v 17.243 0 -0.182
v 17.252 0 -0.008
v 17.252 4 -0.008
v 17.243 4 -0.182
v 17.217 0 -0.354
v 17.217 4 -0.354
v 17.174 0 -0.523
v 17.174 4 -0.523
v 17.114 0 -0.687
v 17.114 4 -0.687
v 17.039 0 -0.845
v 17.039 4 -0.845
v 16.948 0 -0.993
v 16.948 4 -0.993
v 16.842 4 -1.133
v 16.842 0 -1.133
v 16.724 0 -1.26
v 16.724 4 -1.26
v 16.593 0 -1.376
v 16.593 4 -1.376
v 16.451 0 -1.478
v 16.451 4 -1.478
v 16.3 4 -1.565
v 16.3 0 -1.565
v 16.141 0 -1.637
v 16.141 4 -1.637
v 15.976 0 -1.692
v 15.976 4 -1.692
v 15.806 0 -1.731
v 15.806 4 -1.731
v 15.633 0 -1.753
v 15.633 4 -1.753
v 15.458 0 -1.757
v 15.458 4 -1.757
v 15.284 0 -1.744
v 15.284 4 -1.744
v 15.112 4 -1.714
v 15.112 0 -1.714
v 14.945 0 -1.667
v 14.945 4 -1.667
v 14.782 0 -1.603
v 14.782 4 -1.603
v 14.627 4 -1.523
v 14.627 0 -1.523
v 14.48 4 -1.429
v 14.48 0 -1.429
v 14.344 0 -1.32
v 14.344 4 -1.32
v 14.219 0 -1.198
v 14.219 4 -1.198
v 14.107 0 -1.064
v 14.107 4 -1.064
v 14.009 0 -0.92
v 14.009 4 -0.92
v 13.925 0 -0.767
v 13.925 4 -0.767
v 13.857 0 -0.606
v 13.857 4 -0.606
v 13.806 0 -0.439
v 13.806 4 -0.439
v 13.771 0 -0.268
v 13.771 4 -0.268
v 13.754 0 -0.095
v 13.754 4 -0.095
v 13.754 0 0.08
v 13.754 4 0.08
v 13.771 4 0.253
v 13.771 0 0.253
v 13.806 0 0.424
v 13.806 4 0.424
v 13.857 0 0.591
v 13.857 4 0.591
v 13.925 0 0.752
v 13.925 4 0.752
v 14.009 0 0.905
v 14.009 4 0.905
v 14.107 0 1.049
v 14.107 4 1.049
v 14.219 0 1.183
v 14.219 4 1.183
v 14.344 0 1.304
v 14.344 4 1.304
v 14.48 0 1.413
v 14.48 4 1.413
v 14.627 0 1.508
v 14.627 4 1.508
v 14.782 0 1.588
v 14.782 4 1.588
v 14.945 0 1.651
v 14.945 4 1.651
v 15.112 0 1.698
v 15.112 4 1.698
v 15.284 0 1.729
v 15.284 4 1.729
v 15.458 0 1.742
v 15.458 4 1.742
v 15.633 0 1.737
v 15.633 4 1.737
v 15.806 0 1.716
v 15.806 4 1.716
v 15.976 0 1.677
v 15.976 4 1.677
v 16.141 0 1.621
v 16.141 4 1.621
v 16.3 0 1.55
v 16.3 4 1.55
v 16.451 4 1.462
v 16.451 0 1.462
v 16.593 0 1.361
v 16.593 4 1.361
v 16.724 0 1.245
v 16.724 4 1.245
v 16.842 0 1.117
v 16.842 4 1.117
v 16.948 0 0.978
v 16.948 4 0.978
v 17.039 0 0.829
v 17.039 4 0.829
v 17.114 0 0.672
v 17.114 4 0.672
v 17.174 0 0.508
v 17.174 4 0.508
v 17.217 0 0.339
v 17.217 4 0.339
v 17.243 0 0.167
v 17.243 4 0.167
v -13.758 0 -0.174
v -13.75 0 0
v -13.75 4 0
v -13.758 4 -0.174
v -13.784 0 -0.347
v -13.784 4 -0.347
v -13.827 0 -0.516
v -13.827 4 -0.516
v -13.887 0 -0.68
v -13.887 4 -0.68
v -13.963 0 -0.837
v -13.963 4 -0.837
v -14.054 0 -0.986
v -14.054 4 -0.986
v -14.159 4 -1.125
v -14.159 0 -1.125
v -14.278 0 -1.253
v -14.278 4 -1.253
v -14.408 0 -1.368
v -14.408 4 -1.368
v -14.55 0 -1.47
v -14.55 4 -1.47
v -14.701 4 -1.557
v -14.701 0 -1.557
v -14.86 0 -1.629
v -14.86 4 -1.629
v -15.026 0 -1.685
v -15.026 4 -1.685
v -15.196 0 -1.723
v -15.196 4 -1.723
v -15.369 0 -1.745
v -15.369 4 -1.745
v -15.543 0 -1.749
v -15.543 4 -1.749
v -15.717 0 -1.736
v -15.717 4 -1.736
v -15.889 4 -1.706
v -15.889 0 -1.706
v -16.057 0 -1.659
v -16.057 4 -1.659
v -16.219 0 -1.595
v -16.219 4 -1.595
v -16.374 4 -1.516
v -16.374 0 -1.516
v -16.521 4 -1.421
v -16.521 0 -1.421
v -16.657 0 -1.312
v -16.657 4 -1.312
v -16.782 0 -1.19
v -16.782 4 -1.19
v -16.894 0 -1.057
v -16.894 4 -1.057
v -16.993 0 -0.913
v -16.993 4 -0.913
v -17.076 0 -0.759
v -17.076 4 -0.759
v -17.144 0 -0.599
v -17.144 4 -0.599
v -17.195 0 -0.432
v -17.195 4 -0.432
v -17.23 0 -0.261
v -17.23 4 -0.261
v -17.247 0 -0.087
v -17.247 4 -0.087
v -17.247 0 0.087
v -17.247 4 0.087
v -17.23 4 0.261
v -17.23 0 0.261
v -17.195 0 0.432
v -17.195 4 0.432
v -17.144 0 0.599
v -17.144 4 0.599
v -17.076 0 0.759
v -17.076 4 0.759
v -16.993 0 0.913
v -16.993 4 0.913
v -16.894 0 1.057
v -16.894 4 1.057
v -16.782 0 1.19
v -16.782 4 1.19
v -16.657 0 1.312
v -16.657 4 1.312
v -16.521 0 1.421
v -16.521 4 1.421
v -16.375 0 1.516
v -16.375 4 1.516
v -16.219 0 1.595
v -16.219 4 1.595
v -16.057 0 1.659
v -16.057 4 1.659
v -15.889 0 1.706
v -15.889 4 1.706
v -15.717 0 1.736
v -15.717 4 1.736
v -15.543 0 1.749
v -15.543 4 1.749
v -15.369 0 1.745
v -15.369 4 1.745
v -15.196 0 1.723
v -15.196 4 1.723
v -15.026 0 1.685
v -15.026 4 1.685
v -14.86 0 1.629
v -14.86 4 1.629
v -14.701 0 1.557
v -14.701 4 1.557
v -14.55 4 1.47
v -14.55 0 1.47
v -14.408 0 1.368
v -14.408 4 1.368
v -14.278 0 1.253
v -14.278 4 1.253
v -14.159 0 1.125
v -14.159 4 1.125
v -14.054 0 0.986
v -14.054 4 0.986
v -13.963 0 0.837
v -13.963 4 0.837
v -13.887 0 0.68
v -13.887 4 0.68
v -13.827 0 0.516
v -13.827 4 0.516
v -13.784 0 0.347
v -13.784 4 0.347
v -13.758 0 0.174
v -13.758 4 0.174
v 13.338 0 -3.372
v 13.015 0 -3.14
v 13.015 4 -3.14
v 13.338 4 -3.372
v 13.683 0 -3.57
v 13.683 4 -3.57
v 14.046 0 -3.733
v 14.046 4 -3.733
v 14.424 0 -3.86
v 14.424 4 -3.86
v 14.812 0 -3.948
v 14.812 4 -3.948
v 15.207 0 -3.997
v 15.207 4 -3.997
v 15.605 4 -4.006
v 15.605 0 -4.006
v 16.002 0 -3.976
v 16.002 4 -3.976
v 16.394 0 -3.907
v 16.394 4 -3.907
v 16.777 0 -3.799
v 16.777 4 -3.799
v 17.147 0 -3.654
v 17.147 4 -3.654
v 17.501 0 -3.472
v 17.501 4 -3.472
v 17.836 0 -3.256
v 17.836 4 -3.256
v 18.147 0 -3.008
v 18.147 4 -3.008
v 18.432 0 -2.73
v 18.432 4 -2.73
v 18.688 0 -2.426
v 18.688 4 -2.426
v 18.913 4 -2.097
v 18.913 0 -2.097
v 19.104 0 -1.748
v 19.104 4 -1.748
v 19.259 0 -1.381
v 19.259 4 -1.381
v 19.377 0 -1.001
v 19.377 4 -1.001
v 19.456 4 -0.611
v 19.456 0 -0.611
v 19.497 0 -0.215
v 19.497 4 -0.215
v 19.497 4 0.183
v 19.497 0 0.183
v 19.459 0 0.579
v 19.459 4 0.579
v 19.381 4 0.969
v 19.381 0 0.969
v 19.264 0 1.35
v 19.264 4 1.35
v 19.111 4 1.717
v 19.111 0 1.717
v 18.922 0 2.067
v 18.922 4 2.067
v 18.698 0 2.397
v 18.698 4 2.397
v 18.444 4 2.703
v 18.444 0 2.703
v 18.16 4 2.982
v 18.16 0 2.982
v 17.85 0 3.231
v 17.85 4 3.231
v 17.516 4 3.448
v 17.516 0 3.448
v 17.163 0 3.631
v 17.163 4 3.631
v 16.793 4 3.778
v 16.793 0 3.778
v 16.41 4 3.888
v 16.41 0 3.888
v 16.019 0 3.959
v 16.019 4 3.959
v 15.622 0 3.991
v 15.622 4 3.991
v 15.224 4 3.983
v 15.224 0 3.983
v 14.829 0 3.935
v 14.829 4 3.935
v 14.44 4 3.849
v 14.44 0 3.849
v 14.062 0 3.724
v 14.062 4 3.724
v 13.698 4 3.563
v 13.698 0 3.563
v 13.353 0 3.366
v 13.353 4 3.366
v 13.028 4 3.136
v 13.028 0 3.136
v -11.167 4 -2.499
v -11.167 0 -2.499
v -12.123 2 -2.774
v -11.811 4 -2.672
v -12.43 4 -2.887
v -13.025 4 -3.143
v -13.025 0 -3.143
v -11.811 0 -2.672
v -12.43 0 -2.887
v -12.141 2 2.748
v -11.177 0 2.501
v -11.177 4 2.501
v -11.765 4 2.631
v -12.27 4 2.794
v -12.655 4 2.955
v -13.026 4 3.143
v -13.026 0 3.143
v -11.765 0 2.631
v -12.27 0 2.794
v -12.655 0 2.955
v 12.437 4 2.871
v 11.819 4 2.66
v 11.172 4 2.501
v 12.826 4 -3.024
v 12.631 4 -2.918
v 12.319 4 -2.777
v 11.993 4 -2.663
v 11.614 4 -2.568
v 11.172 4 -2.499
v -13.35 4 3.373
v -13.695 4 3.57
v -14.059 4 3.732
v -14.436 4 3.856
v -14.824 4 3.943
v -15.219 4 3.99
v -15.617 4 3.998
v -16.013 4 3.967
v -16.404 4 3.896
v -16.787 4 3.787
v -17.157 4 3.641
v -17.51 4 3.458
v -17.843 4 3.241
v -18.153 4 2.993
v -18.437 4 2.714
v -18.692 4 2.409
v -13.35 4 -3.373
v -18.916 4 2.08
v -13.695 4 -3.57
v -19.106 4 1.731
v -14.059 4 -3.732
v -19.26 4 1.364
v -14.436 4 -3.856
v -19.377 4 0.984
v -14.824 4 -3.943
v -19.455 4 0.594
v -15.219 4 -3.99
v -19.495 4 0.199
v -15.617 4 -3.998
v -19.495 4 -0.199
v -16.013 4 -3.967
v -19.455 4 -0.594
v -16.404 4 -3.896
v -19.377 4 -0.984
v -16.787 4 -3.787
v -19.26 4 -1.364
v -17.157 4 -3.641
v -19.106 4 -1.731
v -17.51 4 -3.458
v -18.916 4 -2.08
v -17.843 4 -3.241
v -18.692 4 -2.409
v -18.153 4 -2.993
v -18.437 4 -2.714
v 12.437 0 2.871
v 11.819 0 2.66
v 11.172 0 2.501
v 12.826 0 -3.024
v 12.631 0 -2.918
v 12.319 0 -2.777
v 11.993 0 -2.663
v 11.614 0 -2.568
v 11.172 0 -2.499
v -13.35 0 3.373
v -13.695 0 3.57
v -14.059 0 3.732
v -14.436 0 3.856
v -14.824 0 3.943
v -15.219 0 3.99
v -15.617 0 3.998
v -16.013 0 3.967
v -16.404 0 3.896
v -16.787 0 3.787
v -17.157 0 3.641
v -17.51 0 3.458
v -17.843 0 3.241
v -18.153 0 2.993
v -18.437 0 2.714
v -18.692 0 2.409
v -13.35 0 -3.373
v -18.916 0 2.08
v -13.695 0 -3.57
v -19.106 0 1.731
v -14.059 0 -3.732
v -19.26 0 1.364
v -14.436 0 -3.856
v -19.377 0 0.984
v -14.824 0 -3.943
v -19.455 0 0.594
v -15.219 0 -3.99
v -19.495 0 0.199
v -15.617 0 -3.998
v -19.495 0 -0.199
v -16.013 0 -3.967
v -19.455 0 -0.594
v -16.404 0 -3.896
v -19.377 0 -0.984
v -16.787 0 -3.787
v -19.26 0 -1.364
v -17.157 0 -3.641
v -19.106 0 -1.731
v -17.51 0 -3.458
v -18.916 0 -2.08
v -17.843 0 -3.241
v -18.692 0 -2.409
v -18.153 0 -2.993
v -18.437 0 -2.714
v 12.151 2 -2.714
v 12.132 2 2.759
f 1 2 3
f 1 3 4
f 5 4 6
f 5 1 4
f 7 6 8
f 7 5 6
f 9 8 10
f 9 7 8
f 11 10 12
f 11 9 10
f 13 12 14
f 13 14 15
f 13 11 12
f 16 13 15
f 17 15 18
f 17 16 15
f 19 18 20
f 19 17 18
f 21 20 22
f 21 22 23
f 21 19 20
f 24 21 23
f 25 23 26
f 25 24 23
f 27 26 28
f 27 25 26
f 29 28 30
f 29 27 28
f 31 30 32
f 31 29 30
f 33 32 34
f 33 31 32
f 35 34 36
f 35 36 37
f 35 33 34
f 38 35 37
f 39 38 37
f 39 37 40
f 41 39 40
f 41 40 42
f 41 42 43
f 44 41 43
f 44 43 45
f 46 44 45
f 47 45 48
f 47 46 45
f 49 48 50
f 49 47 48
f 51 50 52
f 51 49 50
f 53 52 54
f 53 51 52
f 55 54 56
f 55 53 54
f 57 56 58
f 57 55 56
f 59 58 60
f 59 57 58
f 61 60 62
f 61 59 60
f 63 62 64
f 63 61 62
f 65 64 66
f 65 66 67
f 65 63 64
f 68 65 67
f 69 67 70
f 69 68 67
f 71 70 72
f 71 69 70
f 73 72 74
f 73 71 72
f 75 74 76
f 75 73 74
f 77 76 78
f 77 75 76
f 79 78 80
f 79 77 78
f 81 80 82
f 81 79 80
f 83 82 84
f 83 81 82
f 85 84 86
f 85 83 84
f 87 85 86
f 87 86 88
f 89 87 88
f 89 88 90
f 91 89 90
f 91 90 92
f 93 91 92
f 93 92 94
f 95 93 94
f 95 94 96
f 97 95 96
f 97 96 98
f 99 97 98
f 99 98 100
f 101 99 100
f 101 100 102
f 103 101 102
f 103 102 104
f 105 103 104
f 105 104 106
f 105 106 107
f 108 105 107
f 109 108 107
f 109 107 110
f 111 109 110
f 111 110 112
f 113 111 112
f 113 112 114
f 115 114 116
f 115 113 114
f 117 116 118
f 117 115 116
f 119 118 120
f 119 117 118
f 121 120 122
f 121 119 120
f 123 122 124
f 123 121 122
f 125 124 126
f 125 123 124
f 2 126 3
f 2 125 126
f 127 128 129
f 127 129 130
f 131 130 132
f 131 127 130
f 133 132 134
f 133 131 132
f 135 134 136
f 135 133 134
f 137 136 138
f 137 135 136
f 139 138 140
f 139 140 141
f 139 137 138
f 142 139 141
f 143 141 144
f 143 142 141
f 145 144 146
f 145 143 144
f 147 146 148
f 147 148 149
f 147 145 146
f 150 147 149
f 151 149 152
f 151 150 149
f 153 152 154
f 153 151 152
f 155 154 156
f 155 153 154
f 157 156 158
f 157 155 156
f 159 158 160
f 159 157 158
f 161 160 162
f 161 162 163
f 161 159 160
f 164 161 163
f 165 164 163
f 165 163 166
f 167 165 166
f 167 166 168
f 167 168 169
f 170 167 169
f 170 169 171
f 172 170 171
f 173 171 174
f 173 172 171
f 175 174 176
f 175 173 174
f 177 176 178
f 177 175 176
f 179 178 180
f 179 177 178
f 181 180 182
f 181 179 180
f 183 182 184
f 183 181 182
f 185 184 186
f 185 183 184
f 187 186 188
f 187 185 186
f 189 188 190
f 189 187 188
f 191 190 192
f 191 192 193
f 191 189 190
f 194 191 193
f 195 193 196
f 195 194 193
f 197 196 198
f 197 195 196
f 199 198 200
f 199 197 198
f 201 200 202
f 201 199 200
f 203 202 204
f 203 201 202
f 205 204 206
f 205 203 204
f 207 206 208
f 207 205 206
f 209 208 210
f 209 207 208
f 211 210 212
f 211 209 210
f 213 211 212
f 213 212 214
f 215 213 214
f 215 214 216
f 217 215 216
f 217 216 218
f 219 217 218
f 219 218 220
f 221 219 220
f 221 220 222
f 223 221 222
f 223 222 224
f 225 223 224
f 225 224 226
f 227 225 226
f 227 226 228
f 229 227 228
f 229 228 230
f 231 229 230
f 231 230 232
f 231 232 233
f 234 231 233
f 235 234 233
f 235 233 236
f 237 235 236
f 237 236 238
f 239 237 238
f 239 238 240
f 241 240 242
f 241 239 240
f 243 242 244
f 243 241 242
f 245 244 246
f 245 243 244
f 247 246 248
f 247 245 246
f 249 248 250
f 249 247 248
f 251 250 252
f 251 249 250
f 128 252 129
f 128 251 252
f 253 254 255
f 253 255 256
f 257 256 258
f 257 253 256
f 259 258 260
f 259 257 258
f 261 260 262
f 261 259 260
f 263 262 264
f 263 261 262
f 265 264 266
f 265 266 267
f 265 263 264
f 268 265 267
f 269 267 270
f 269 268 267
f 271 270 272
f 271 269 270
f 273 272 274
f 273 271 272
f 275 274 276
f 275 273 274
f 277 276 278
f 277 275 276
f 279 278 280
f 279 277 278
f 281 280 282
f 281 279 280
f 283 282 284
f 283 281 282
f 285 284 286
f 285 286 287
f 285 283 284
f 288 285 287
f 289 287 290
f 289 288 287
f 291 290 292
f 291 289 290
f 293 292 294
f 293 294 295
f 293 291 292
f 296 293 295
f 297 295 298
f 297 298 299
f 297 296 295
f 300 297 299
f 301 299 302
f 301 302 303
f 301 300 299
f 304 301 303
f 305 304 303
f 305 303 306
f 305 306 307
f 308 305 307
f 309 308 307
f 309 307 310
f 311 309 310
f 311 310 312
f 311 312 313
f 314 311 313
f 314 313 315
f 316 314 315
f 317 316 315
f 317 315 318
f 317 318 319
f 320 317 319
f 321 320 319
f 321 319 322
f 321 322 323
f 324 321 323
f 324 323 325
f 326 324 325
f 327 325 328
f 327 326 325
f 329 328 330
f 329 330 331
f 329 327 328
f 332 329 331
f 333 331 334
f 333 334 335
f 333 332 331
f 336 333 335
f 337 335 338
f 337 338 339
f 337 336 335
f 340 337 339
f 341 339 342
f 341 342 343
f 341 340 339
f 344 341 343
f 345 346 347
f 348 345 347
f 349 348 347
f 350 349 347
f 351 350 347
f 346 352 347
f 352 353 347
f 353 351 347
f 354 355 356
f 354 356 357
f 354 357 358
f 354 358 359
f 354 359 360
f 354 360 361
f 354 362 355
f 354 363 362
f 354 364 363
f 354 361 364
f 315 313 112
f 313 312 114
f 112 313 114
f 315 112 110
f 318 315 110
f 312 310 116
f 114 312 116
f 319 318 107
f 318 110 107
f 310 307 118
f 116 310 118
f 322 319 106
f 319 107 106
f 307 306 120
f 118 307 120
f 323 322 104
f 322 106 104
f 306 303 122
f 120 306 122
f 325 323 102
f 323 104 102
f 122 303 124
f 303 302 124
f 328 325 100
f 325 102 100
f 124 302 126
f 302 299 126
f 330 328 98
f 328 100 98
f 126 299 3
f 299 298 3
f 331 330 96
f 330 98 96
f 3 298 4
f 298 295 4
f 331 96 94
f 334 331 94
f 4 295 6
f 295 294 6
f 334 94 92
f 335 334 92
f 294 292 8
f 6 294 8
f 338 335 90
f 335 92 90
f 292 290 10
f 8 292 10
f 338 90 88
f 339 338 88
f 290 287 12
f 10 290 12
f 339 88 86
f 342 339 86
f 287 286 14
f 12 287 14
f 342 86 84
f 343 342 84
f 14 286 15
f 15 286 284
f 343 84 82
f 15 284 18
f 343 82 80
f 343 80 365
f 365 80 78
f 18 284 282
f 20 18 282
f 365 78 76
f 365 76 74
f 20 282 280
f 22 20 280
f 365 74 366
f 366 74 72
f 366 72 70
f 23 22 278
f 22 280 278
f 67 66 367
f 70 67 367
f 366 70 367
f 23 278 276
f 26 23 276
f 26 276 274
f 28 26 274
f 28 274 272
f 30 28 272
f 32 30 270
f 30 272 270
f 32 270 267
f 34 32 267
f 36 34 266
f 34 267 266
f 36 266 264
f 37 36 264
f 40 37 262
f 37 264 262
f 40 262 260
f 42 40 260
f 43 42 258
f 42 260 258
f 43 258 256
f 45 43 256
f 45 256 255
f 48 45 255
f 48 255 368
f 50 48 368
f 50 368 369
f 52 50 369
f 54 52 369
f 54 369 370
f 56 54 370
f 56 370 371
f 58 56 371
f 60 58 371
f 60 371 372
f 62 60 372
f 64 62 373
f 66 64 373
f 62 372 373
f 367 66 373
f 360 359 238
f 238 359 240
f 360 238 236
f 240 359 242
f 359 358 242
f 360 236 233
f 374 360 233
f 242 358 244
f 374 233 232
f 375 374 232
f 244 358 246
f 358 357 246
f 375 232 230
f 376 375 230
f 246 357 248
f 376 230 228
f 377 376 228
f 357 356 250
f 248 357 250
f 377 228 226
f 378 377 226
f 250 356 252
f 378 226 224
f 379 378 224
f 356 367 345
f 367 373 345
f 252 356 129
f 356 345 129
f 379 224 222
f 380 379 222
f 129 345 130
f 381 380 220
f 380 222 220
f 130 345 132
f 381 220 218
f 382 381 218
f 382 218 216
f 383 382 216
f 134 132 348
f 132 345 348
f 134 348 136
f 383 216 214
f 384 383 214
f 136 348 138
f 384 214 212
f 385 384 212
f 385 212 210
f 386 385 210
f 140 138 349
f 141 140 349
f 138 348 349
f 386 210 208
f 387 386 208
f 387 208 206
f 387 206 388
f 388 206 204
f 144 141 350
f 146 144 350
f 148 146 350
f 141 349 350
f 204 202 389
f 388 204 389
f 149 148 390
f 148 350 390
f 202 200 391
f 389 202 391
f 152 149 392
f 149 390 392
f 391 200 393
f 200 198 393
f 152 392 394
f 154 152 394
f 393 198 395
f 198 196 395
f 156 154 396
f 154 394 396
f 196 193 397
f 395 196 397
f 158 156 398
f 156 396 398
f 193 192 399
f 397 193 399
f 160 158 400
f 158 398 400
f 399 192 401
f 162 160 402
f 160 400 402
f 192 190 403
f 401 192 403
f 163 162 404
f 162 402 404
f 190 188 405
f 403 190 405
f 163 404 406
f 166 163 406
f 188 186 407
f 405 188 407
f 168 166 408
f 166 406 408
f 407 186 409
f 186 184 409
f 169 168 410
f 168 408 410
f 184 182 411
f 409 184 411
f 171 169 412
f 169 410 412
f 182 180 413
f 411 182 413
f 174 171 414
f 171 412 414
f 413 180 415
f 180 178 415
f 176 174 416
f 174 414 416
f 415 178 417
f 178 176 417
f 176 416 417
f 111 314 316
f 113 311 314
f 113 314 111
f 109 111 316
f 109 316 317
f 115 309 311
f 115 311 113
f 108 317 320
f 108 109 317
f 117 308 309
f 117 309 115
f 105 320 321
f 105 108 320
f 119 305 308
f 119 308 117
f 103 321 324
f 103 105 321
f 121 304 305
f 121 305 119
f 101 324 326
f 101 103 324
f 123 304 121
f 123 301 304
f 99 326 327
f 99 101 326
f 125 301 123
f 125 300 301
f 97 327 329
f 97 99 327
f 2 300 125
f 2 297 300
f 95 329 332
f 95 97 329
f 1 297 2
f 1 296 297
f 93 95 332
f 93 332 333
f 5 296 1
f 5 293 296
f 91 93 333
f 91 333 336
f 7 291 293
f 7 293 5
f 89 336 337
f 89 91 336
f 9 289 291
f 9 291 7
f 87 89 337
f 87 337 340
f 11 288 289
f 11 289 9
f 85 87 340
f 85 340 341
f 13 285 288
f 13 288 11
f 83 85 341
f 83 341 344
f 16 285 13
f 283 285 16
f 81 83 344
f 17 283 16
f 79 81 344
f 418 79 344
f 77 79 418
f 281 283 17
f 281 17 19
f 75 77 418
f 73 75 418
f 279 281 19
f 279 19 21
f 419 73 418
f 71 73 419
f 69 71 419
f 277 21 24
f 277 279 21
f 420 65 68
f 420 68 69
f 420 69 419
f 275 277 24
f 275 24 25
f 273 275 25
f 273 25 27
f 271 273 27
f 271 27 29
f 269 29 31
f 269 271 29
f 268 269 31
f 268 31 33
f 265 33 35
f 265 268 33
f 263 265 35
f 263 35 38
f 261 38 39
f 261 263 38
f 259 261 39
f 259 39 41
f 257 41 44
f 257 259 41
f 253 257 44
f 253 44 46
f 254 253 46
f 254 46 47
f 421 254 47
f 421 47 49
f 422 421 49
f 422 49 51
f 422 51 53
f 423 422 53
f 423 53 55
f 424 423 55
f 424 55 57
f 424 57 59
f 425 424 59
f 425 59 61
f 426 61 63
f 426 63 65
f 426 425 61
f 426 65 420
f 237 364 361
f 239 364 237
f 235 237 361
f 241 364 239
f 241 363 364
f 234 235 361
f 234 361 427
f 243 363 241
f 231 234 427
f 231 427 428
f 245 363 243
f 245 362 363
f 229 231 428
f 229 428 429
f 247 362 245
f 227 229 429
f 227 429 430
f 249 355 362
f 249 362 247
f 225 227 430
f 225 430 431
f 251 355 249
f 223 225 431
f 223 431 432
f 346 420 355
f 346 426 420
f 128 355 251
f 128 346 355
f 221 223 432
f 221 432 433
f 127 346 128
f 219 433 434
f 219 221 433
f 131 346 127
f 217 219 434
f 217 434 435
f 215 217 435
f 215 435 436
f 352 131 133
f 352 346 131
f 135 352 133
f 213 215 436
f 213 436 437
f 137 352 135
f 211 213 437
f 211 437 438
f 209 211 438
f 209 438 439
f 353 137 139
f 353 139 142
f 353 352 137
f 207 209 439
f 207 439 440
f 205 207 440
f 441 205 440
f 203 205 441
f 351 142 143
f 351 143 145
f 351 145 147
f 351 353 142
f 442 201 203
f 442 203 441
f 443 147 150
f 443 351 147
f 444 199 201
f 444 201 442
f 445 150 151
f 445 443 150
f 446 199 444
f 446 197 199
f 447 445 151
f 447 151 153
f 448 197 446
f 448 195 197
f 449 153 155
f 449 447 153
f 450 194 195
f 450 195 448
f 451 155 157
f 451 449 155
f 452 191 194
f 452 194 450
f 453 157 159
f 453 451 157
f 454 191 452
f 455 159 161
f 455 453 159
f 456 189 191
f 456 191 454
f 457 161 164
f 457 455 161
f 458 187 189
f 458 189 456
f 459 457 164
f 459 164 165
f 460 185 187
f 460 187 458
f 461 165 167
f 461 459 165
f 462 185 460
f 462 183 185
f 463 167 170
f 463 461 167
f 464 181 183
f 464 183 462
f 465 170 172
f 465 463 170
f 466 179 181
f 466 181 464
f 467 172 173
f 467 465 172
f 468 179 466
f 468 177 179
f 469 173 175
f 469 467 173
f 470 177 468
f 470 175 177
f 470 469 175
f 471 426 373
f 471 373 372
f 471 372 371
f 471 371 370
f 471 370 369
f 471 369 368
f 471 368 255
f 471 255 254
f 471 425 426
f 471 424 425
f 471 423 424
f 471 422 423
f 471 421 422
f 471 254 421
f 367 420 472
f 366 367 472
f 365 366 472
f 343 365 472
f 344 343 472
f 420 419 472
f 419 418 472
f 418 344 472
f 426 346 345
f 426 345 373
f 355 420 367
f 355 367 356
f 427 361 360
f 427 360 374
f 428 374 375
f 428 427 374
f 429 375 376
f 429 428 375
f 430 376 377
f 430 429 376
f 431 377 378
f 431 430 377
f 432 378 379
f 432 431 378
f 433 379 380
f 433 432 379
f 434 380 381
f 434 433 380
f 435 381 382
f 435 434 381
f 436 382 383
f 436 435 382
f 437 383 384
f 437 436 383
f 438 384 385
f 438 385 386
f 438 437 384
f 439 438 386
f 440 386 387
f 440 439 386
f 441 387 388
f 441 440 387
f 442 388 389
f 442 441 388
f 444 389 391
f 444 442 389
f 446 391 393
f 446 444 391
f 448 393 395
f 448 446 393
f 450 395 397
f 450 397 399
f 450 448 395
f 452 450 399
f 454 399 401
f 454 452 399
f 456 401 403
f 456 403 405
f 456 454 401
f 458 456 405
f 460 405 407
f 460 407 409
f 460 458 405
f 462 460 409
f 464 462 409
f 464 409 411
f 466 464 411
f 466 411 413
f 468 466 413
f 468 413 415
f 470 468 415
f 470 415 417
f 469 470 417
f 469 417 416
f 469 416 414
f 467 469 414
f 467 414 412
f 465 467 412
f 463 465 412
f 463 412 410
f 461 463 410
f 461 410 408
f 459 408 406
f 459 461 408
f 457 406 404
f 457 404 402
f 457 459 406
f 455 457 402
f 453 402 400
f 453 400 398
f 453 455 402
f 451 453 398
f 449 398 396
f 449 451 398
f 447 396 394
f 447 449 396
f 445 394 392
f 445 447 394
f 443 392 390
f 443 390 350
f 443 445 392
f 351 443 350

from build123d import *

# Parameters (mm, degrees)
CROQUIS1_R              = 1.75
SALIENTE_EXTRUIR1_DEPTH = 4


with BuildPart() as part:
    # Croquis1 → Saliente-Extruir1 (new body)
    with BuildSketch(Plane(origin=(0, 0, 0), x_dir=(1, 0, 0), z_dir=(0, 1, 0))):
        with BuildLine():
            Line((-11.167093962, 2.499461471), (11.171906038, 2.499461471))
            add(Edge.make_bspline(
                [(11.171906038, 2.499461471), (12.207826719, 2.608902185), (13.014633598, 3.14028172)],
                knots=[0, 0, 0, 0.652329484, 0.652329484, 0.652329484], degree=2))
            ThreePointArc((13.014633598, 3.14028172), (19.501897093, 0.016094387), (13.027906038, -3.135504249))
            add(Edge.make_bspline(
                [(11.171906038, -2.500538529), (12.163350933, -2.700124356), (13.027906038, -3.135504249)],
                knots=[0, 0, 0, 0.381033485, 0.381033485, 0.381033485], degree=2))
            Line((11.171906038, -2.500538529), (-11.176720188, -2.500538529))
            add(Edge.make_bspline(
                [(-11.176720188, -2.500538529), (-12.181502866, -2.673255137), (-13.0255, -3.143139195)],
                knots=[0, 0, 0, 0.480047459, 0.480047459, 0.480047459], degree=2))
            ThreePointArc((-13.0255, -3.143139195), (-19.4995, 0), (-13.0255, 3.143139195))
            add(Edge.make_bspline(
                [(-11.167093962, 2.499461471), (-12.150237992, 2.727686633), (-13.0255, 3.143139195)],
                knots=[0, 0, 0, 0.309192528, 0.309192528, 0.309192528], degree=2))
        make_face()
        with Locations((-15.4995, 0)):
            Circle(CROQUIS1_R, mode=Mode.SUBTRACT)
        with Locations((15.501906038, 0.007634946)):
            Circle(CROQUIS1_R, mode=Mode.SUBTRACT)
    extrude(amount=SALIENTE_EXTRUIR1_DEPTH)


solid = part.part
